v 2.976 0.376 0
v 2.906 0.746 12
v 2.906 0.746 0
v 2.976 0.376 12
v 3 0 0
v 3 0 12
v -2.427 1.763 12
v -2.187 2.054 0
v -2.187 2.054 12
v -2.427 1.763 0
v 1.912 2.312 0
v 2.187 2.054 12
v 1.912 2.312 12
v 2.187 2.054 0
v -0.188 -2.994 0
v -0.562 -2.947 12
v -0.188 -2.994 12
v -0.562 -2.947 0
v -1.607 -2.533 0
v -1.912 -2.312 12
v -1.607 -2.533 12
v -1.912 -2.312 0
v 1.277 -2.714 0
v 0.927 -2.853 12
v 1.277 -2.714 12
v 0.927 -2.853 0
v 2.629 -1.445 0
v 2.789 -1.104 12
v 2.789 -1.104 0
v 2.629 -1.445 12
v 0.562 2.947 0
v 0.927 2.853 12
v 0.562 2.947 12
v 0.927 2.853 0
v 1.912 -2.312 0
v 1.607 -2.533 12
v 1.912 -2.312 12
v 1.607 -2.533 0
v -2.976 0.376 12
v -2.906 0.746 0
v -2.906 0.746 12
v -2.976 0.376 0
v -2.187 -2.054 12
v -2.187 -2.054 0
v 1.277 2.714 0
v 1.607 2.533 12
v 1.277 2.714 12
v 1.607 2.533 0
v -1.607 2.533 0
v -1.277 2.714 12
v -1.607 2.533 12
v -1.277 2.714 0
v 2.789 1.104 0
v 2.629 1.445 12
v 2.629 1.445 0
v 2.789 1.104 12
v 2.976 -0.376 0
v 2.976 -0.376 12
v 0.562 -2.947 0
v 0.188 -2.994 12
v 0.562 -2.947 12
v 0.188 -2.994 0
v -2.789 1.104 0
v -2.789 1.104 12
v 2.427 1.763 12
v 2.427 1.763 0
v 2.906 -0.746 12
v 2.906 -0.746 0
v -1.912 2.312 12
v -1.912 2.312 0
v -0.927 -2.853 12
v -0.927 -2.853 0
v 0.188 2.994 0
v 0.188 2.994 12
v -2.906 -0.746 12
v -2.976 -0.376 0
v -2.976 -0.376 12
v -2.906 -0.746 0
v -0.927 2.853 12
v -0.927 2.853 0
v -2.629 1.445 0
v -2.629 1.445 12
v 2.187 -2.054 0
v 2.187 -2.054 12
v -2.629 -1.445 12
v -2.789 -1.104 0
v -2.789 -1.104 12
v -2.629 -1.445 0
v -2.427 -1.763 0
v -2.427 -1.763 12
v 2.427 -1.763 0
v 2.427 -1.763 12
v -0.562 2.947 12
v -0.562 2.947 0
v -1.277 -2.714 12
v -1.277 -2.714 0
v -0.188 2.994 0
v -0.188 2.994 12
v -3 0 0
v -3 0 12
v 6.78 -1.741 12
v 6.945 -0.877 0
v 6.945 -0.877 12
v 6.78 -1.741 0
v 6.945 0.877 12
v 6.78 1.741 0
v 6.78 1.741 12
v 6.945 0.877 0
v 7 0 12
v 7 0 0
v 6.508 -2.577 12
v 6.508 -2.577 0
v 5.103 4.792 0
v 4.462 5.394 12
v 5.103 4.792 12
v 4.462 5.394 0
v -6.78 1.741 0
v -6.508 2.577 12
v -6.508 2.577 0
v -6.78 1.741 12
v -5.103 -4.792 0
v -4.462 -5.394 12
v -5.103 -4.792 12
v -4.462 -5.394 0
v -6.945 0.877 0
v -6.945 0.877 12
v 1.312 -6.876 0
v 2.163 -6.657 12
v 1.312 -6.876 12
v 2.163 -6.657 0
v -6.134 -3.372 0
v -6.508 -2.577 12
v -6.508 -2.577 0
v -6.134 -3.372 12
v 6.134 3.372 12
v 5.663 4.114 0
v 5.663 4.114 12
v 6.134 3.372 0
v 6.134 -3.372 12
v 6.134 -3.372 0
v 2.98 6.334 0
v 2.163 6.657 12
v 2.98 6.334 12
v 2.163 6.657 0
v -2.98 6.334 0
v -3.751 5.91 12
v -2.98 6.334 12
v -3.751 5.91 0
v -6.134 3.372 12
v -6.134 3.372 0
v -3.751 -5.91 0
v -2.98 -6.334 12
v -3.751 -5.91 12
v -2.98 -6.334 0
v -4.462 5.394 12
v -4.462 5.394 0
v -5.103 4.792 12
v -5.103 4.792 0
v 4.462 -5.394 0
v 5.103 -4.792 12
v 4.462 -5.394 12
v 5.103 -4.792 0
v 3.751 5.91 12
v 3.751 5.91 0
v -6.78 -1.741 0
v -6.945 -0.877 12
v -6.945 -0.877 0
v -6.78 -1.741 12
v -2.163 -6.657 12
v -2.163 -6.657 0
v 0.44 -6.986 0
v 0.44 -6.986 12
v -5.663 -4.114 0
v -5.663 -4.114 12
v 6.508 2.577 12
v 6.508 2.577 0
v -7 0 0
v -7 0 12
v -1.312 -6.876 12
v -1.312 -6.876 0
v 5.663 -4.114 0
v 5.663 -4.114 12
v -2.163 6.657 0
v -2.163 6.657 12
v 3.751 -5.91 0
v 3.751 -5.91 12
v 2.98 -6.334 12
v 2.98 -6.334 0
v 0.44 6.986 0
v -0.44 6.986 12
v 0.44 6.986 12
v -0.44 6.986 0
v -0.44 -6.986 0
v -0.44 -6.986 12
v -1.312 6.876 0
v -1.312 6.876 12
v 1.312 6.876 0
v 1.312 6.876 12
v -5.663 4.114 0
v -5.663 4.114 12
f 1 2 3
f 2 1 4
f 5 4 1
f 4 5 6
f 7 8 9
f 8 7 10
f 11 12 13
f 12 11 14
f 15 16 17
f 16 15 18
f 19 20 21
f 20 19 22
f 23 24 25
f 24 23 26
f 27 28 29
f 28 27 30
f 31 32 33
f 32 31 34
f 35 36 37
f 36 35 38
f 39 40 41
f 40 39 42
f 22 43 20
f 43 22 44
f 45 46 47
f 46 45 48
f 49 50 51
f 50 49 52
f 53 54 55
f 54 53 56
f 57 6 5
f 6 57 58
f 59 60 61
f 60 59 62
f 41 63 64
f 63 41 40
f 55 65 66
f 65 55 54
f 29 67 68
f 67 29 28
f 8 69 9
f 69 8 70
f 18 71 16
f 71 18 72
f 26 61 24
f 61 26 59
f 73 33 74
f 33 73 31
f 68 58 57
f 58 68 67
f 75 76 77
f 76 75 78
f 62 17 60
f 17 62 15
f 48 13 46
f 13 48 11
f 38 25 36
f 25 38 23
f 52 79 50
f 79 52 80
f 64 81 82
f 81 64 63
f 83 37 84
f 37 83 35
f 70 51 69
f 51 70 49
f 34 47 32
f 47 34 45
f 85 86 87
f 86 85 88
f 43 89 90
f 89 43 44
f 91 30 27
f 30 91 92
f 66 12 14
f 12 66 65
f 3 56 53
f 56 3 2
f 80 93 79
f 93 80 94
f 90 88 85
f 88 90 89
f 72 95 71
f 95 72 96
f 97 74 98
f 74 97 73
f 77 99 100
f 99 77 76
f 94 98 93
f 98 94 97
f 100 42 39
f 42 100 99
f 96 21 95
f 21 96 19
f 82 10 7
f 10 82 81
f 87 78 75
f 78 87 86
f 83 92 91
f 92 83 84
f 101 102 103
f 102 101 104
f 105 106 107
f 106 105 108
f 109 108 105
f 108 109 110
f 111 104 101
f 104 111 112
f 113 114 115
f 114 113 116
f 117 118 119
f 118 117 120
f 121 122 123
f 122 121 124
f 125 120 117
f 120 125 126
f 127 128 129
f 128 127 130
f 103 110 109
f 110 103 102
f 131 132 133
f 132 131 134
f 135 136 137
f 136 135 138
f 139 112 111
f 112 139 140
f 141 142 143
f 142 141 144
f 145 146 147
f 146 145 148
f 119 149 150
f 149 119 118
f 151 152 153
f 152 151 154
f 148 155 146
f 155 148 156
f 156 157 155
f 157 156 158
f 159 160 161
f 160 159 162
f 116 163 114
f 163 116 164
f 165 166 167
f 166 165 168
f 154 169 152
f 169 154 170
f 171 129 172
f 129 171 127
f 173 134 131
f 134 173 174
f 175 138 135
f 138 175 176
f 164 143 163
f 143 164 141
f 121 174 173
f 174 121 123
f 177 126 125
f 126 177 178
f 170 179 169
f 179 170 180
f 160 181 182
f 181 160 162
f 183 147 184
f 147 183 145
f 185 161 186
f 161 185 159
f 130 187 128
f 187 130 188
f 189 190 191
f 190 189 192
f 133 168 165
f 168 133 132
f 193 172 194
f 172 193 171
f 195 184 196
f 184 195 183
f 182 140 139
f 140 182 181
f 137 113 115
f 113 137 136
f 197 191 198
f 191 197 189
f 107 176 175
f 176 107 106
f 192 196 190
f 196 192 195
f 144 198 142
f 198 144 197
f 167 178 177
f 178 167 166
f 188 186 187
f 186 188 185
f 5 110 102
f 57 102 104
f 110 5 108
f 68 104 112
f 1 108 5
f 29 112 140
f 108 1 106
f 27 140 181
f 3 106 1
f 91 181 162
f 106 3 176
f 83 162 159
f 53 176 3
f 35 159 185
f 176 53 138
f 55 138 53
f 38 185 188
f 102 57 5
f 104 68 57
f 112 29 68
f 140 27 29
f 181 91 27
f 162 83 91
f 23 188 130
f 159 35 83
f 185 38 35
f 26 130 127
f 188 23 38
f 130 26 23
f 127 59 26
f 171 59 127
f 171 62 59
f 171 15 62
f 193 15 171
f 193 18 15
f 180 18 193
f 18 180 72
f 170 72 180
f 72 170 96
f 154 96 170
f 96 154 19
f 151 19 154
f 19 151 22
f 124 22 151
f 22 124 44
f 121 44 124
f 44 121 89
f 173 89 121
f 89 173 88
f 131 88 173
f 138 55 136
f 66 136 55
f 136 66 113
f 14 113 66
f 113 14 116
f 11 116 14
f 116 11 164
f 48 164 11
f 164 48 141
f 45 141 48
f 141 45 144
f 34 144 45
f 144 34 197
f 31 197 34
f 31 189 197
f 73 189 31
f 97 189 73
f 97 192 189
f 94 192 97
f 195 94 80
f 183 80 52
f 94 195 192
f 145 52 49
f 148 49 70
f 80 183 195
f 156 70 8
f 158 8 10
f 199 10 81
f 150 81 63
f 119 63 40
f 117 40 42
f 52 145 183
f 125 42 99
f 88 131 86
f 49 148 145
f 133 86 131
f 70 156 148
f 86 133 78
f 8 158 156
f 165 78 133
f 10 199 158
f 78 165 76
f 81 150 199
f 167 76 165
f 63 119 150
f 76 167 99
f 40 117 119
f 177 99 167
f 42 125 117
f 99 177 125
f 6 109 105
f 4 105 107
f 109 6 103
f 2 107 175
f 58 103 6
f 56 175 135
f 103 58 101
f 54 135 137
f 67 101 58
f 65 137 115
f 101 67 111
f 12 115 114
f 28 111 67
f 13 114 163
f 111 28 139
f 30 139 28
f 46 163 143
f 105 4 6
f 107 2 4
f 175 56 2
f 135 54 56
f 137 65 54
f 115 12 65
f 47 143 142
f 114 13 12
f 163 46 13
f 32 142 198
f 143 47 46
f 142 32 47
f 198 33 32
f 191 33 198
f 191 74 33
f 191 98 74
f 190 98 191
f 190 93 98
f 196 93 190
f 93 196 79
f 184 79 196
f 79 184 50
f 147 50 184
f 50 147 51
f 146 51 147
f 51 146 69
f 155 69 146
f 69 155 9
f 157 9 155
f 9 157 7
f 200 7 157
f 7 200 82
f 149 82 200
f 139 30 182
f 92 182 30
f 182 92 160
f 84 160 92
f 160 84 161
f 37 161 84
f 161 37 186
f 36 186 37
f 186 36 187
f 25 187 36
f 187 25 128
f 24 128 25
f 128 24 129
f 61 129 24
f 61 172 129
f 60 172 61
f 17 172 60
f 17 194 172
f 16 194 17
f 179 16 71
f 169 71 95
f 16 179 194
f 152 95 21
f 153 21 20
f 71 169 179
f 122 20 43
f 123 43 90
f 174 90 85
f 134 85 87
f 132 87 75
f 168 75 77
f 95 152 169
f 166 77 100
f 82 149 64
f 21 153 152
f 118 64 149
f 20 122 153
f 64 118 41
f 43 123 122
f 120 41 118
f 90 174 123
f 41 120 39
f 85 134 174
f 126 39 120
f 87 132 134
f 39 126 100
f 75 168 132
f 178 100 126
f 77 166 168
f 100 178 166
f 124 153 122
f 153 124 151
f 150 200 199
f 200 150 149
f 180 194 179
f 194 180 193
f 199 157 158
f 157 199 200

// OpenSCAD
$fn = 50;


difference() {
	union() {
		cylinder(h = 12, r = 7.0000000000);
	}
	union() {
		translate(v = [0.0000000000, 0.0000000000, -100.0000000000]) {
			cylinder(h = 200, r = 3.0000000000);
		}
		cylinder(h = 12, r = 1.5000000000);
		cylinder(h = 12, r = 1.5000000000);
		cylinder(h = 12, r = 1.5000000000);
	}
}
